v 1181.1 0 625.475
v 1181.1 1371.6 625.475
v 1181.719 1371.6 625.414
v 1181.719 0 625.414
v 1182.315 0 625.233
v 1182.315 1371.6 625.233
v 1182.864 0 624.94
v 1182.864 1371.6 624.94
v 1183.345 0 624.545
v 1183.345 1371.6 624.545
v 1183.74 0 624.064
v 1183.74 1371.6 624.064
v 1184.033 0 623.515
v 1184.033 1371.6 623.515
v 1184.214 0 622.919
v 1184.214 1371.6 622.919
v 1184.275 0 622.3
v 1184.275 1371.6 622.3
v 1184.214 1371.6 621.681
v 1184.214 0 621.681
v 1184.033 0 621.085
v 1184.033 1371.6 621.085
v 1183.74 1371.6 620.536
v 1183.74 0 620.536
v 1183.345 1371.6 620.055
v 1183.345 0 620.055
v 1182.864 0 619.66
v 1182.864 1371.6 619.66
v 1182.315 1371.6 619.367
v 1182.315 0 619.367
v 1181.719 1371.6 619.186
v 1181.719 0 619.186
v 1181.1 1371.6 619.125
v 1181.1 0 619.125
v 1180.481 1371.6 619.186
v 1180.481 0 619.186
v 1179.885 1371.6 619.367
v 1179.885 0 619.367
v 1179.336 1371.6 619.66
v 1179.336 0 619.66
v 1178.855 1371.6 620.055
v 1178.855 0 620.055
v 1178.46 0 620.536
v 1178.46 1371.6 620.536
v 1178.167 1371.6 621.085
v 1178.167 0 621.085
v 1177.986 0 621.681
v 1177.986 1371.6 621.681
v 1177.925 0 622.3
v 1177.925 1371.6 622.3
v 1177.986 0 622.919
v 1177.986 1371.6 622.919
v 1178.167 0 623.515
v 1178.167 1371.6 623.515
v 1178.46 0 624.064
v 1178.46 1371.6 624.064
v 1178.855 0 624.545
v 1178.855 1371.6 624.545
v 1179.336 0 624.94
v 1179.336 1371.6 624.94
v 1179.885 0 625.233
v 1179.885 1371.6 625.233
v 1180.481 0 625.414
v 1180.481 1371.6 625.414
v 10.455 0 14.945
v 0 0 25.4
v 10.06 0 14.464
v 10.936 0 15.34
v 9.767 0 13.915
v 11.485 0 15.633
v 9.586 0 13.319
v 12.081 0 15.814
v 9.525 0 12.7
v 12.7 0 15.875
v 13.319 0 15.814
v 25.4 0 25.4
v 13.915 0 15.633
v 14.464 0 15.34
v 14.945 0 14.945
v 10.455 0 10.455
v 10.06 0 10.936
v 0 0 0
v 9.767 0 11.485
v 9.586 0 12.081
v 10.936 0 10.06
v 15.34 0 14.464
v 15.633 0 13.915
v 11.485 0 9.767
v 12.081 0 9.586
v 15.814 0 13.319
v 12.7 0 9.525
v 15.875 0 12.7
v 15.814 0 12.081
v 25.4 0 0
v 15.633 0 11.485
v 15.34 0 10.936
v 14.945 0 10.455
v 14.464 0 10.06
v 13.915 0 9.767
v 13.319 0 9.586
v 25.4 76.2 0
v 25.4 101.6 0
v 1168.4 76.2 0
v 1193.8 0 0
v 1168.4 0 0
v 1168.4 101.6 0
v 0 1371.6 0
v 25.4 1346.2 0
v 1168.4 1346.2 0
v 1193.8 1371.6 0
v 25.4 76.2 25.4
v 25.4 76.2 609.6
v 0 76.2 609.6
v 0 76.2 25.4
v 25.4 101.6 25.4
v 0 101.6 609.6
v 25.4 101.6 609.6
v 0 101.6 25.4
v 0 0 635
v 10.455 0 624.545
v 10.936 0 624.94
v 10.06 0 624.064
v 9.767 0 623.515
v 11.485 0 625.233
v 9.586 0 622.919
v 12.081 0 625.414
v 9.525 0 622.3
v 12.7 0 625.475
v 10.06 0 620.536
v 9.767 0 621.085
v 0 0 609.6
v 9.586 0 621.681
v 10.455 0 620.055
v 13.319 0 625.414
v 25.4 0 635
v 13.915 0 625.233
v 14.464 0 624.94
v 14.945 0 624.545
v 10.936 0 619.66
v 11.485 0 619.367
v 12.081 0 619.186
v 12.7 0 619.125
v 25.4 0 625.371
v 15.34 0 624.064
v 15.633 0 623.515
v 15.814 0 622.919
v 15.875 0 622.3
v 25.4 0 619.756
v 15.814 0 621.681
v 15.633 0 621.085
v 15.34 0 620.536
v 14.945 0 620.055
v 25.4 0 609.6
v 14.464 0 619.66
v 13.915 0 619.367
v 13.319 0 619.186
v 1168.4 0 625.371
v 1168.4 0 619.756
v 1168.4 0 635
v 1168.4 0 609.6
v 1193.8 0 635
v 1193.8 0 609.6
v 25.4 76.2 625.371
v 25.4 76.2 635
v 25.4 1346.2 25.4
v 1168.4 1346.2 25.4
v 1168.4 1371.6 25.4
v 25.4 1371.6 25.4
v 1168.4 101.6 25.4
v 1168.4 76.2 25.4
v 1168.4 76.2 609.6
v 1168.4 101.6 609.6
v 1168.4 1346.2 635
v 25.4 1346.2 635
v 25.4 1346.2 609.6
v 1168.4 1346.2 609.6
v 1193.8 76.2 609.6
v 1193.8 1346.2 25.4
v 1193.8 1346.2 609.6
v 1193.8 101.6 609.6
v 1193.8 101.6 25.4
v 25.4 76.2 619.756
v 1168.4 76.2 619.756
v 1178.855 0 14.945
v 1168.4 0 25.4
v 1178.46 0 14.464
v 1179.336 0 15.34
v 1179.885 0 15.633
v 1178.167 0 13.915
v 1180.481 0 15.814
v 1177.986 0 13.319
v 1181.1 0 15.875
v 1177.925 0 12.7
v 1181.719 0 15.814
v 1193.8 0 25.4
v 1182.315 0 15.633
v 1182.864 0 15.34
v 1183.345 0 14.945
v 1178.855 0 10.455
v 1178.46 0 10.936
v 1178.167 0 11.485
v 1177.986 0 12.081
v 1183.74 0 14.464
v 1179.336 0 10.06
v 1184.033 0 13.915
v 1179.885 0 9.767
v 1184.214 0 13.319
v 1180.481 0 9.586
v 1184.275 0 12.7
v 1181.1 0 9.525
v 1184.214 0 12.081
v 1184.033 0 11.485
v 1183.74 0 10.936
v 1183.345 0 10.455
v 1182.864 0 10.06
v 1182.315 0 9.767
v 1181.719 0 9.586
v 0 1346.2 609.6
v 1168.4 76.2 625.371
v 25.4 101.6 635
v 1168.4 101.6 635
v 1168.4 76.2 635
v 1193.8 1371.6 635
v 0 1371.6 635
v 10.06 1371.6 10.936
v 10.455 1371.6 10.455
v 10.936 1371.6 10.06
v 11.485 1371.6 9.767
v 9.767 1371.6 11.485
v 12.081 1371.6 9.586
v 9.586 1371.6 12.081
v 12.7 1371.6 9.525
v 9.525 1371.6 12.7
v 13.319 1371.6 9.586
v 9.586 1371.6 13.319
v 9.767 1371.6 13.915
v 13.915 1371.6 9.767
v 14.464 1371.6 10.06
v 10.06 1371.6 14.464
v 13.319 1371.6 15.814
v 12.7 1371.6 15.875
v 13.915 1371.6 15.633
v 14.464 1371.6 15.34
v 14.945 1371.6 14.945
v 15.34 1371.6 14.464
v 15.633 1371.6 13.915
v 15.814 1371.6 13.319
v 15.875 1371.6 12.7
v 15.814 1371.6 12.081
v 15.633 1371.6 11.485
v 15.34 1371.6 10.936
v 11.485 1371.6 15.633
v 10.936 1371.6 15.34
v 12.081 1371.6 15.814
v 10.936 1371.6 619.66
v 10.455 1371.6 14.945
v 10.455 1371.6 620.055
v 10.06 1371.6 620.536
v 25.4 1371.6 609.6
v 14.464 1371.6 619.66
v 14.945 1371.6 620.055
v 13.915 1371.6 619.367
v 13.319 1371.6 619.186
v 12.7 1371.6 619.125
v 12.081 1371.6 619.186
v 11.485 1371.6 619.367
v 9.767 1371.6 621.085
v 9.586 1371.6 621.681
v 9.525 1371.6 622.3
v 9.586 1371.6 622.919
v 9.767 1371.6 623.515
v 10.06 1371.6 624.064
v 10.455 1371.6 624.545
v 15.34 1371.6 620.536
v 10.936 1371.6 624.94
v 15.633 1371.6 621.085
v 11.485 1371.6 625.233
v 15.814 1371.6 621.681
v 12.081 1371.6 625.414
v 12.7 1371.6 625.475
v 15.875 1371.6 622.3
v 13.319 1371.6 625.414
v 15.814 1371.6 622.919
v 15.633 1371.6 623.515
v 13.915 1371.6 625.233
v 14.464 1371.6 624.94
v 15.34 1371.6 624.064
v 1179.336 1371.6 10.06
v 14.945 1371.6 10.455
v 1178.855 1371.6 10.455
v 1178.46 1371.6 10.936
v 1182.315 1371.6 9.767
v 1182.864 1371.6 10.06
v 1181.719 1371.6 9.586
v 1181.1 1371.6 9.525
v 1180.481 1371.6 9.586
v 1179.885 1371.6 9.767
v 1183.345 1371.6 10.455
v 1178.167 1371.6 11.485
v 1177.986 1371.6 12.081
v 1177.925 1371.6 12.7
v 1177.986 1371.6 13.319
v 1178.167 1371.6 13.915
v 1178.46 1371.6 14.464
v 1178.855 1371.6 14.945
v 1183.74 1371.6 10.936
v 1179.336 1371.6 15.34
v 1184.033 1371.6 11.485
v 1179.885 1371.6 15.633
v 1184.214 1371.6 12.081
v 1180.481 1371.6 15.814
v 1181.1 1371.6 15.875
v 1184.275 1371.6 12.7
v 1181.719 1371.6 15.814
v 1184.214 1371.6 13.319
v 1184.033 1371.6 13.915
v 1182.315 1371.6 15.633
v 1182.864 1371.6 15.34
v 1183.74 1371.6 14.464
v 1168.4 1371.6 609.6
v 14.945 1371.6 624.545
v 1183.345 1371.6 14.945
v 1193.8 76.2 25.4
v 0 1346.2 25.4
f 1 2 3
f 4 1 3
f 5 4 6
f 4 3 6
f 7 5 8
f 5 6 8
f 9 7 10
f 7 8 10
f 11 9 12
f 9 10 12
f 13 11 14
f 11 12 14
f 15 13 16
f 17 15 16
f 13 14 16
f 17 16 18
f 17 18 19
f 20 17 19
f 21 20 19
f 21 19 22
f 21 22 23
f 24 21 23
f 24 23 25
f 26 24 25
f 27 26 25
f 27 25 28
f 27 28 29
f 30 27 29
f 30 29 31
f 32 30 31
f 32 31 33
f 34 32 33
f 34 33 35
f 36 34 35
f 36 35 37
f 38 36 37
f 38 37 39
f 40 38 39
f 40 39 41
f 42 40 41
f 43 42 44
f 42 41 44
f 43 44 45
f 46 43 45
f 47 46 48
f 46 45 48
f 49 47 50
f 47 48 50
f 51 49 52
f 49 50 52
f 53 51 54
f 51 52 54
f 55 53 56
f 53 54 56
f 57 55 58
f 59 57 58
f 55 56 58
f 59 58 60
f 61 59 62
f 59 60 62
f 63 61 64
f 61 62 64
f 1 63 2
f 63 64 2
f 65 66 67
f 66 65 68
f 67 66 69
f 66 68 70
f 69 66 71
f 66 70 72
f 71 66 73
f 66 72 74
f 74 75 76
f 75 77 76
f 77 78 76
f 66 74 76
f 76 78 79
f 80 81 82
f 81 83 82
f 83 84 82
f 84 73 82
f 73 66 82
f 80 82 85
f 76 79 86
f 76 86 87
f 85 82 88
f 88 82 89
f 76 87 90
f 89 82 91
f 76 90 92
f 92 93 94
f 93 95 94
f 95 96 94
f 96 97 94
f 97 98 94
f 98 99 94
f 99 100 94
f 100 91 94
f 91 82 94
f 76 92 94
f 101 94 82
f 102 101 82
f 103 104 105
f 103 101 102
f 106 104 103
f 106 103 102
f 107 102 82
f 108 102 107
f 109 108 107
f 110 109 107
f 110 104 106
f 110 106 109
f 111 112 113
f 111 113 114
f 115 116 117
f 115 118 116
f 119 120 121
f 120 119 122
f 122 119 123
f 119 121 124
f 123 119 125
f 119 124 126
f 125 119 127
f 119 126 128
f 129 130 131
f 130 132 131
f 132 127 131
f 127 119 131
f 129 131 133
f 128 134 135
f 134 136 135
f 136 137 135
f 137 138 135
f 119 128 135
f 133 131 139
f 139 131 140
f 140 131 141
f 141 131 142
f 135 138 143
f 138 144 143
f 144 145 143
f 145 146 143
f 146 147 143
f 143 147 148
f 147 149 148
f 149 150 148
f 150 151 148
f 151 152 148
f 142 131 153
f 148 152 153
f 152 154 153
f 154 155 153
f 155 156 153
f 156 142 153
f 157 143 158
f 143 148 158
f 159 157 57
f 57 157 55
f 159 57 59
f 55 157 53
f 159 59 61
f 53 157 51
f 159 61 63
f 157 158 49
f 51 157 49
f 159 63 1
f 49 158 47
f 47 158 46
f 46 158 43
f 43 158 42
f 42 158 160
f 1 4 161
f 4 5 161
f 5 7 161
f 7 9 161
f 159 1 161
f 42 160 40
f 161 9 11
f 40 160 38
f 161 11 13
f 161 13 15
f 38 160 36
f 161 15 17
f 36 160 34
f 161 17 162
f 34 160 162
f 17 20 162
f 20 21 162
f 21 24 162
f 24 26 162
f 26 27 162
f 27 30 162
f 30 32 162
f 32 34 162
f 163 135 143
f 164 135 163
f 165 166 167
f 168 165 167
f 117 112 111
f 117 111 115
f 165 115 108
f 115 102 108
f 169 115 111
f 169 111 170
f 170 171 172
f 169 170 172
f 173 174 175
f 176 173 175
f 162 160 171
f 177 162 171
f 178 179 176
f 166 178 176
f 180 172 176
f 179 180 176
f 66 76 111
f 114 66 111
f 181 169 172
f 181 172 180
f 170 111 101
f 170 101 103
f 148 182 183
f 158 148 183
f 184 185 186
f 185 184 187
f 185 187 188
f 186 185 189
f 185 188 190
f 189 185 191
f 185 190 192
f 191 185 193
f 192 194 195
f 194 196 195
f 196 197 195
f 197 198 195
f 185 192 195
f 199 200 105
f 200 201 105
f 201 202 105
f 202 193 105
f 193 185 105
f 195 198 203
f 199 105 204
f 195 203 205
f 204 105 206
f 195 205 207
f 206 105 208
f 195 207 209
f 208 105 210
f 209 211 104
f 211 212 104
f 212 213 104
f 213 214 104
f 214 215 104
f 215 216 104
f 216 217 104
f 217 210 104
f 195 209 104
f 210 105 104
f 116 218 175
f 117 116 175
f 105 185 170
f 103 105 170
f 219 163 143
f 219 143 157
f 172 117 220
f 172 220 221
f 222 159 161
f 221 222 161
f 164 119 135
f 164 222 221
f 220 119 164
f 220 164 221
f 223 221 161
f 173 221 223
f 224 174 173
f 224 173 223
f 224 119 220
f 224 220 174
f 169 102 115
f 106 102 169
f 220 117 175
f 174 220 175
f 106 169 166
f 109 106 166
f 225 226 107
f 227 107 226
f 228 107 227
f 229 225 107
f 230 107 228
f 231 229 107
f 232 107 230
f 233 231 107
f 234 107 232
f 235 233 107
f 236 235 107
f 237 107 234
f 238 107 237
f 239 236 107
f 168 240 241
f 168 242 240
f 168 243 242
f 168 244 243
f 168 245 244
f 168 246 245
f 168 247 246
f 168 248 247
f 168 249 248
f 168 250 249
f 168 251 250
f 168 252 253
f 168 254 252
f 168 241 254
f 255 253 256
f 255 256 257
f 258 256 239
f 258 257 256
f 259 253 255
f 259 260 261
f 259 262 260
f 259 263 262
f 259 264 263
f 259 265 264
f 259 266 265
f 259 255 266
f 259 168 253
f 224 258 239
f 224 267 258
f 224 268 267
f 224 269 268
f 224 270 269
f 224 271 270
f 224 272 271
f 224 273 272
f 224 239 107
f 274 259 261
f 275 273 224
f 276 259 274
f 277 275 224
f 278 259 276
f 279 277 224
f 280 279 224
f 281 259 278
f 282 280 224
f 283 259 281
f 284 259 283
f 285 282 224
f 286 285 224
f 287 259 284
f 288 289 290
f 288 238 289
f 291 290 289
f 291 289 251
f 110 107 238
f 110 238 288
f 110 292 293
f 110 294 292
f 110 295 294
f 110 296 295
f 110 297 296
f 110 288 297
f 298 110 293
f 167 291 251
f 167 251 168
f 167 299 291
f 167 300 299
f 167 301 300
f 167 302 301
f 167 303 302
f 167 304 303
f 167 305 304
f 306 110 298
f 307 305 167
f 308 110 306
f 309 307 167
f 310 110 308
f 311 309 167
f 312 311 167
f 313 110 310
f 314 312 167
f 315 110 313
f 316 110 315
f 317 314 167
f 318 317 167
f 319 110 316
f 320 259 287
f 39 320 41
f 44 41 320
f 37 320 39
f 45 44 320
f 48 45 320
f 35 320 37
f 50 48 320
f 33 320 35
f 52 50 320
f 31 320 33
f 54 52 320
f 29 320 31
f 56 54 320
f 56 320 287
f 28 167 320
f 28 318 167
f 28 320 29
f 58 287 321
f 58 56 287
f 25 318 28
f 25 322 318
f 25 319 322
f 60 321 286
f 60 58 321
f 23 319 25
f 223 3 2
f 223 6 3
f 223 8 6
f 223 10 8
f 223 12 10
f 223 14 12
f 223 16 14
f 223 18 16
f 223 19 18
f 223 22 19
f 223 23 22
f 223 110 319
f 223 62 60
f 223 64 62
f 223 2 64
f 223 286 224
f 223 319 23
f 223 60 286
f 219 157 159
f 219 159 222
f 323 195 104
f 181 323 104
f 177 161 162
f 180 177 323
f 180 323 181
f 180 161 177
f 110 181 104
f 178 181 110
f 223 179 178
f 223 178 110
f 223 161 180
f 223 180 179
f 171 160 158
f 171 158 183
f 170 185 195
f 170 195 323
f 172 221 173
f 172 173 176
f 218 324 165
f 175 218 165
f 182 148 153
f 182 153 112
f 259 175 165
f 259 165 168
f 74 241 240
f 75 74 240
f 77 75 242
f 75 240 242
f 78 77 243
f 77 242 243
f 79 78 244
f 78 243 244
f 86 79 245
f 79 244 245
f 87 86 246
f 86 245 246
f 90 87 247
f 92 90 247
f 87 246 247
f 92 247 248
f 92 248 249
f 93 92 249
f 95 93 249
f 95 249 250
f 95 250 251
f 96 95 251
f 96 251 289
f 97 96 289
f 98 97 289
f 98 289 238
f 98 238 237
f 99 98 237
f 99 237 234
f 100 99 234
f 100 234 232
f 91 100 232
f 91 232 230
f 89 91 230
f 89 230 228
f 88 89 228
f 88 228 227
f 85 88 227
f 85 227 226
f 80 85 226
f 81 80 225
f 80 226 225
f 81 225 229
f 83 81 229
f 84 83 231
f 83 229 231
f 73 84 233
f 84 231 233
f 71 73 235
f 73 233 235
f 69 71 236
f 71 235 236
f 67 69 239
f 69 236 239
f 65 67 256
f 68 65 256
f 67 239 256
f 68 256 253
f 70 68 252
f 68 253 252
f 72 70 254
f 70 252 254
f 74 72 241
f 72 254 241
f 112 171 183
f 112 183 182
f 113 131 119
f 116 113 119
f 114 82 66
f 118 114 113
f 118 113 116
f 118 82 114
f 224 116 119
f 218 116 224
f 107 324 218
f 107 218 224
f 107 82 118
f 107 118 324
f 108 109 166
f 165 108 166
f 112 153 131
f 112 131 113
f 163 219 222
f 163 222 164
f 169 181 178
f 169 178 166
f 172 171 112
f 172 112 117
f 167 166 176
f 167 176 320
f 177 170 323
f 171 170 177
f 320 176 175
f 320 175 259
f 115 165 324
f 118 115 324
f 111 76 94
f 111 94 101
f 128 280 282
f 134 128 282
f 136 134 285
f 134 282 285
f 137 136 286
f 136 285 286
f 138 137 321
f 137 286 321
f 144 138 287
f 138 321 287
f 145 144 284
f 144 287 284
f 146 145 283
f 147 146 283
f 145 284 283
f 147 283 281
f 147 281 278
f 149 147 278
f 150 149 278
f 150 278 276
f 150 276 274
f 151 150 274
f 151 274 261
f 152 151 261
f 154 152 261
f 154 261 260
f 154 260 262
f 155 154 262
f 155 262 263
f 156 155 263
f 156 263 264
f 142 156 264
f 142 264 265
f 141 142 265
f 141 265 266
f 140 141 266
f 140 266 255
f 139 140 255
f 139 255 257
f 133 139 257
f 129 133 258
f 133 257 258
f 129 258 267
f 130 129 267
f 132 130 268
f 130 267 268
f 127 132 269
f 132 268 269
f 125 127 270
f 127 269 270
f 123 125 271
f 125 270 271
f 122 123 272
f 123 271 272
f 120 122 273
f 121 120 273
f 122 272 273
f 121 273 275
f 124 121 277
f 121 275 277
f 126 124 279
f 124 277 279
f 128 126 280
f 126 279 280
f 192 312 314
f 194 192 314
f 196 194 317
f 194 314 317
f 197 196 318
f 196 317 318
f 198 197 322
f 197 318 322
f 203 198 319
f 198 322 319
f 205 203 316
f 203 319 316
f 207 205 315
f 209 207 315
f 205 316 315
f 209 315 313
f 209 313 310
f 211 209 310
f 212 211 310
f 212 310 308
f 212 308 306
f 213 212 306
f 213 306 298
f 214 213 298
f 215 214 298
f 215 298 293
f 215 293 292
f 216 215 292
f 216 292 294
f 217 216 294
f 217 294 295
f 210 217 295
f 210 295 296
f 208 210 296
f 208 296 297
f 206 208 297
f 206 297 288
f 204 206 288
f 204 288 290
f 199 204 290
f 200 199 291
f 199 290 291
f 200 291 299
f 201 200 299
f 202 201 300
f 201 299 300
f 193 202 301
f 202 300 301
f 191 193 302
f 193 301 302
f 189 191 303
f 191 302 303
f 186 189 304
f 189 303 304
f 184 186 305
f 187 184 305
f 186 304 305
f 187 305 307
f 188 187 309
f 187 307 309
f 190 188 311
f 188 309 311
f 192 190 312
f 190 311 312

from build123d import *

# Parameters (mm, degrees)
SKETCH1_W       = 1193.8
SKETCH1_H       = 1371.6
EXTRUDE1_DEPTH  = 635
EXTRUDE4_DEPTH  = 1270
SKETCH6_W       = 25.4
SKETCH6_H       = 25.4
EXTRUDE5_DEPTH  = 584.2
SKETCH8_W       = 25.4
SKETCH8_H       = 25.4
EXTRUDE6_DEPTH  = 1143
SKETCH9_W       = 25.4
SKETCH9_H       = 25.4
EXTRUDE7_DEPTH  = 584.2
SKETCH10_W      = 25.4
SKETCH10_H      = 25.4
EXTRUDE8_DEPTH  = 1143
SHELL2_T        = -25.4
SKETCH17_R      = 3.175
EXTRUDE14_DEPTH = 1927.050362789
SKETCH24_W      = 1143
SKETCH24_H      = 584.2
EXTRUDE15_DEPTH = 25.4
SKETCH12_W      = 1143
SKETCH12_H      = 76.2
EXTRUDE16_DEPTH = 38.1
SKETCH13_W      = 584.2
SKETCH13_H      = 76.2
EXTRUDE17_DEPTH = 38.1
SKETCH14_W      = 1143
SKETCH14_H      = 76.2
EXTRUDE18_DEPTH = 38.1
SKETCH11_W      = 584.2
SKETCH11_H      = 76.2
EXTRUDE19_DEPTH = 38.1
SKETCH30_W      = 1143
SKETCH30_H      = 5.614753794
EXTRUDE20_DEPTH = 76.2


with BuildPart() as part:
    # Sketch1 → Extrude1 (new body)
    with BuildSketch(Plane.XY):
        with Locations((596.9, 685.8)):
            Rectangle(SKETCH1_W, SKETCH1_H)
    extrude(amount=EXTRUDE1_DEPTH)

    # Sketch2 → Extrude4 (cut)
    with BuildSketch(Plane(origin=(0, 1371.6, 0), x_dir=(1, 0, 0), z_dir=(0, 1, 0))):
        Polygon((25.4, -609.6), (25.4, -635), (1168.4, -635), (1168.4, -609.6), (1193.8, -609.6), (1193.8, -25.4), (1168.4, -25.4), (1168.4, 0), (25.4, 0), (25.4, -25.4), (0, -25.4), (0, -609.6), align=None)
    extrude(amount=-EXTRUDE4_DEPTH, mode=Mode.SUBTRACT)

    # Sketch6 → Extrude5 (add)
    with BuildSketch(Plane.XY.offset(25.4)):
        with Locations((12.7, 1358.9)):
            Rectangle(SKETCH6_W, SKETCH6_H)
    extrude(amount=EXTRUDE5_DEPTH)

    # Sketch8 → Extrude6 (add)
    with BuildSketch(Plane(origin=(25.4, 0, 0), x_dir=(0, 0, -1), z_dir=(1, 0, 0))):
        with Locations((-622.3, 1358.9)):
            Rectangle(SKETCH8_W, SKETCH8_H)
    extrude(amount=EXTRUDE6_DEPTH)

    # Sketch9 → Extrude7 (add)
    with BuildSketch(Plane(origin=(0, 0, 609.6), x_dir=(-1, 0, 0), z_dir=(0, 0, -1))):
        with Locations((-1181.1, 1358.9)):
            Rectangle(SKETCH9_W, SKETCH9_H)
    extrude(amount=EXTRUDE7_DEPTH)

    # Sketch10 → Extrude8 (add)
    with BuildSketch(Plane.ZY.offset(-1168.4)):
        with Locations((12.7, 1358.9)):
            Rectangle(SKETCH10_W, SKETCH10_H)
    extrude(amount=EXTRUDE8_DEPTH)

    # Shell2
    shell2_openings = [part.faces().sort_by_distance(p)[0] for p in [
        (596.9, 0, 317.5),
    ]]
    offset(amount=SHELL2_T, openings=shell2_openings)

    # Sketch17 → Extrude14 (cut, through all)
    with BuildSketch(Plane(origin=(0, 1371.6, 0), x_dir=(1, 0, 0), z_dir=(0, 1, 0))):
        with Locations(Location((1181.1, -622.3, 0), (0, 0, 270))):
            Circle(SKETCH17_R)
        with Locations(Location((1181.1, -12.7, 0), (0, 0, 270))):
            Circle(SKETCH17_R)
        with Locations(Location((12.7, -12.7, 0), (0, 0, 270))):
            Circle(SKETCH17_R)
        with Locations(Location((12.7, -622.3, 0), (0, 0, 270))):
            Circle(SKETCH17_R)
    extrude(amount=-EXTRUDE14_DEPTH, mode=Mode.SUBTRACT)

    # Sketch24 → Extrude15 (cut)
    with BuildSketch(Plane(origin=(0, 101.6, 0), x_dir=(1, 0, 0), z_dir=(0, 1, 0))):
        with Locations((596.9, -317.5)):
            Rectangle(SKETCH24_W, SKETCH24_H)
    extrude(amount=-EXTRUDE15_DEPTH, mode=Mode.SUBTRACT)

    # Sketch12 → Extrude16 (cut)
    with BuildSketch(Plane.XY.offset(25.4)):
        with Locations((596.9, 38.1)):
            Rectangle(SKETCH12_W, SKETCH12_H)
    extrude(amount=-EXTRUDE16_DEPTH, mode=Mode.SUBTRACT)

    # Sketch13 → Extrude17 (cut)
    with BuildSketch(Plane.ZY.offset(-1168.4)):
        with Locations((317.5, 38.1)):
            Rectangle(SKETCH13_W, SKETCH13_H)
    extrude(amount=-EXTRUDE17_DEPTH, mode=Mode.SUBTRACT)

    # Sketch14 → Extrude18 (cut)
    with BuildSketch(Plane(origin=(0, 0, 609.6), x_dir=(-1, 0, 0), z_dir=(0, 0, -1))):
        with Locations((-596.9, 38.1)):
            Rectangle(SKETCH14_W, SKETCH14_H)
    extrude(amount=-EXTRUDE18_DEPTH, mode=Mode.SUBTRACT)

    # Sketch11 → Extrude19 (cut)
    with BuildSketch(Plane(origin=(25.4, 0, 0), x_dir=(0, 0, -1), z_dir=(1, 0, 0))):
        with Locations((-317.5, 38.1)):
            Rectangle(SKETCH11_W, SKETCH11_H)
    extrude(amount=-EXTRUDE19_DEPTH, mode=Mode.SUBTRACT)

    # Sketch30 → Extrude20 (add)
    with BuildSketch(Plane.XZ.offset(-76.2)):
        with Locations((596.9, 622.563749497)):
            Rectangle(SKETCH30_W, SKETCH30_H)
    extrude(amount=EXTRUDE20_DEPTH)


solid = part.part
